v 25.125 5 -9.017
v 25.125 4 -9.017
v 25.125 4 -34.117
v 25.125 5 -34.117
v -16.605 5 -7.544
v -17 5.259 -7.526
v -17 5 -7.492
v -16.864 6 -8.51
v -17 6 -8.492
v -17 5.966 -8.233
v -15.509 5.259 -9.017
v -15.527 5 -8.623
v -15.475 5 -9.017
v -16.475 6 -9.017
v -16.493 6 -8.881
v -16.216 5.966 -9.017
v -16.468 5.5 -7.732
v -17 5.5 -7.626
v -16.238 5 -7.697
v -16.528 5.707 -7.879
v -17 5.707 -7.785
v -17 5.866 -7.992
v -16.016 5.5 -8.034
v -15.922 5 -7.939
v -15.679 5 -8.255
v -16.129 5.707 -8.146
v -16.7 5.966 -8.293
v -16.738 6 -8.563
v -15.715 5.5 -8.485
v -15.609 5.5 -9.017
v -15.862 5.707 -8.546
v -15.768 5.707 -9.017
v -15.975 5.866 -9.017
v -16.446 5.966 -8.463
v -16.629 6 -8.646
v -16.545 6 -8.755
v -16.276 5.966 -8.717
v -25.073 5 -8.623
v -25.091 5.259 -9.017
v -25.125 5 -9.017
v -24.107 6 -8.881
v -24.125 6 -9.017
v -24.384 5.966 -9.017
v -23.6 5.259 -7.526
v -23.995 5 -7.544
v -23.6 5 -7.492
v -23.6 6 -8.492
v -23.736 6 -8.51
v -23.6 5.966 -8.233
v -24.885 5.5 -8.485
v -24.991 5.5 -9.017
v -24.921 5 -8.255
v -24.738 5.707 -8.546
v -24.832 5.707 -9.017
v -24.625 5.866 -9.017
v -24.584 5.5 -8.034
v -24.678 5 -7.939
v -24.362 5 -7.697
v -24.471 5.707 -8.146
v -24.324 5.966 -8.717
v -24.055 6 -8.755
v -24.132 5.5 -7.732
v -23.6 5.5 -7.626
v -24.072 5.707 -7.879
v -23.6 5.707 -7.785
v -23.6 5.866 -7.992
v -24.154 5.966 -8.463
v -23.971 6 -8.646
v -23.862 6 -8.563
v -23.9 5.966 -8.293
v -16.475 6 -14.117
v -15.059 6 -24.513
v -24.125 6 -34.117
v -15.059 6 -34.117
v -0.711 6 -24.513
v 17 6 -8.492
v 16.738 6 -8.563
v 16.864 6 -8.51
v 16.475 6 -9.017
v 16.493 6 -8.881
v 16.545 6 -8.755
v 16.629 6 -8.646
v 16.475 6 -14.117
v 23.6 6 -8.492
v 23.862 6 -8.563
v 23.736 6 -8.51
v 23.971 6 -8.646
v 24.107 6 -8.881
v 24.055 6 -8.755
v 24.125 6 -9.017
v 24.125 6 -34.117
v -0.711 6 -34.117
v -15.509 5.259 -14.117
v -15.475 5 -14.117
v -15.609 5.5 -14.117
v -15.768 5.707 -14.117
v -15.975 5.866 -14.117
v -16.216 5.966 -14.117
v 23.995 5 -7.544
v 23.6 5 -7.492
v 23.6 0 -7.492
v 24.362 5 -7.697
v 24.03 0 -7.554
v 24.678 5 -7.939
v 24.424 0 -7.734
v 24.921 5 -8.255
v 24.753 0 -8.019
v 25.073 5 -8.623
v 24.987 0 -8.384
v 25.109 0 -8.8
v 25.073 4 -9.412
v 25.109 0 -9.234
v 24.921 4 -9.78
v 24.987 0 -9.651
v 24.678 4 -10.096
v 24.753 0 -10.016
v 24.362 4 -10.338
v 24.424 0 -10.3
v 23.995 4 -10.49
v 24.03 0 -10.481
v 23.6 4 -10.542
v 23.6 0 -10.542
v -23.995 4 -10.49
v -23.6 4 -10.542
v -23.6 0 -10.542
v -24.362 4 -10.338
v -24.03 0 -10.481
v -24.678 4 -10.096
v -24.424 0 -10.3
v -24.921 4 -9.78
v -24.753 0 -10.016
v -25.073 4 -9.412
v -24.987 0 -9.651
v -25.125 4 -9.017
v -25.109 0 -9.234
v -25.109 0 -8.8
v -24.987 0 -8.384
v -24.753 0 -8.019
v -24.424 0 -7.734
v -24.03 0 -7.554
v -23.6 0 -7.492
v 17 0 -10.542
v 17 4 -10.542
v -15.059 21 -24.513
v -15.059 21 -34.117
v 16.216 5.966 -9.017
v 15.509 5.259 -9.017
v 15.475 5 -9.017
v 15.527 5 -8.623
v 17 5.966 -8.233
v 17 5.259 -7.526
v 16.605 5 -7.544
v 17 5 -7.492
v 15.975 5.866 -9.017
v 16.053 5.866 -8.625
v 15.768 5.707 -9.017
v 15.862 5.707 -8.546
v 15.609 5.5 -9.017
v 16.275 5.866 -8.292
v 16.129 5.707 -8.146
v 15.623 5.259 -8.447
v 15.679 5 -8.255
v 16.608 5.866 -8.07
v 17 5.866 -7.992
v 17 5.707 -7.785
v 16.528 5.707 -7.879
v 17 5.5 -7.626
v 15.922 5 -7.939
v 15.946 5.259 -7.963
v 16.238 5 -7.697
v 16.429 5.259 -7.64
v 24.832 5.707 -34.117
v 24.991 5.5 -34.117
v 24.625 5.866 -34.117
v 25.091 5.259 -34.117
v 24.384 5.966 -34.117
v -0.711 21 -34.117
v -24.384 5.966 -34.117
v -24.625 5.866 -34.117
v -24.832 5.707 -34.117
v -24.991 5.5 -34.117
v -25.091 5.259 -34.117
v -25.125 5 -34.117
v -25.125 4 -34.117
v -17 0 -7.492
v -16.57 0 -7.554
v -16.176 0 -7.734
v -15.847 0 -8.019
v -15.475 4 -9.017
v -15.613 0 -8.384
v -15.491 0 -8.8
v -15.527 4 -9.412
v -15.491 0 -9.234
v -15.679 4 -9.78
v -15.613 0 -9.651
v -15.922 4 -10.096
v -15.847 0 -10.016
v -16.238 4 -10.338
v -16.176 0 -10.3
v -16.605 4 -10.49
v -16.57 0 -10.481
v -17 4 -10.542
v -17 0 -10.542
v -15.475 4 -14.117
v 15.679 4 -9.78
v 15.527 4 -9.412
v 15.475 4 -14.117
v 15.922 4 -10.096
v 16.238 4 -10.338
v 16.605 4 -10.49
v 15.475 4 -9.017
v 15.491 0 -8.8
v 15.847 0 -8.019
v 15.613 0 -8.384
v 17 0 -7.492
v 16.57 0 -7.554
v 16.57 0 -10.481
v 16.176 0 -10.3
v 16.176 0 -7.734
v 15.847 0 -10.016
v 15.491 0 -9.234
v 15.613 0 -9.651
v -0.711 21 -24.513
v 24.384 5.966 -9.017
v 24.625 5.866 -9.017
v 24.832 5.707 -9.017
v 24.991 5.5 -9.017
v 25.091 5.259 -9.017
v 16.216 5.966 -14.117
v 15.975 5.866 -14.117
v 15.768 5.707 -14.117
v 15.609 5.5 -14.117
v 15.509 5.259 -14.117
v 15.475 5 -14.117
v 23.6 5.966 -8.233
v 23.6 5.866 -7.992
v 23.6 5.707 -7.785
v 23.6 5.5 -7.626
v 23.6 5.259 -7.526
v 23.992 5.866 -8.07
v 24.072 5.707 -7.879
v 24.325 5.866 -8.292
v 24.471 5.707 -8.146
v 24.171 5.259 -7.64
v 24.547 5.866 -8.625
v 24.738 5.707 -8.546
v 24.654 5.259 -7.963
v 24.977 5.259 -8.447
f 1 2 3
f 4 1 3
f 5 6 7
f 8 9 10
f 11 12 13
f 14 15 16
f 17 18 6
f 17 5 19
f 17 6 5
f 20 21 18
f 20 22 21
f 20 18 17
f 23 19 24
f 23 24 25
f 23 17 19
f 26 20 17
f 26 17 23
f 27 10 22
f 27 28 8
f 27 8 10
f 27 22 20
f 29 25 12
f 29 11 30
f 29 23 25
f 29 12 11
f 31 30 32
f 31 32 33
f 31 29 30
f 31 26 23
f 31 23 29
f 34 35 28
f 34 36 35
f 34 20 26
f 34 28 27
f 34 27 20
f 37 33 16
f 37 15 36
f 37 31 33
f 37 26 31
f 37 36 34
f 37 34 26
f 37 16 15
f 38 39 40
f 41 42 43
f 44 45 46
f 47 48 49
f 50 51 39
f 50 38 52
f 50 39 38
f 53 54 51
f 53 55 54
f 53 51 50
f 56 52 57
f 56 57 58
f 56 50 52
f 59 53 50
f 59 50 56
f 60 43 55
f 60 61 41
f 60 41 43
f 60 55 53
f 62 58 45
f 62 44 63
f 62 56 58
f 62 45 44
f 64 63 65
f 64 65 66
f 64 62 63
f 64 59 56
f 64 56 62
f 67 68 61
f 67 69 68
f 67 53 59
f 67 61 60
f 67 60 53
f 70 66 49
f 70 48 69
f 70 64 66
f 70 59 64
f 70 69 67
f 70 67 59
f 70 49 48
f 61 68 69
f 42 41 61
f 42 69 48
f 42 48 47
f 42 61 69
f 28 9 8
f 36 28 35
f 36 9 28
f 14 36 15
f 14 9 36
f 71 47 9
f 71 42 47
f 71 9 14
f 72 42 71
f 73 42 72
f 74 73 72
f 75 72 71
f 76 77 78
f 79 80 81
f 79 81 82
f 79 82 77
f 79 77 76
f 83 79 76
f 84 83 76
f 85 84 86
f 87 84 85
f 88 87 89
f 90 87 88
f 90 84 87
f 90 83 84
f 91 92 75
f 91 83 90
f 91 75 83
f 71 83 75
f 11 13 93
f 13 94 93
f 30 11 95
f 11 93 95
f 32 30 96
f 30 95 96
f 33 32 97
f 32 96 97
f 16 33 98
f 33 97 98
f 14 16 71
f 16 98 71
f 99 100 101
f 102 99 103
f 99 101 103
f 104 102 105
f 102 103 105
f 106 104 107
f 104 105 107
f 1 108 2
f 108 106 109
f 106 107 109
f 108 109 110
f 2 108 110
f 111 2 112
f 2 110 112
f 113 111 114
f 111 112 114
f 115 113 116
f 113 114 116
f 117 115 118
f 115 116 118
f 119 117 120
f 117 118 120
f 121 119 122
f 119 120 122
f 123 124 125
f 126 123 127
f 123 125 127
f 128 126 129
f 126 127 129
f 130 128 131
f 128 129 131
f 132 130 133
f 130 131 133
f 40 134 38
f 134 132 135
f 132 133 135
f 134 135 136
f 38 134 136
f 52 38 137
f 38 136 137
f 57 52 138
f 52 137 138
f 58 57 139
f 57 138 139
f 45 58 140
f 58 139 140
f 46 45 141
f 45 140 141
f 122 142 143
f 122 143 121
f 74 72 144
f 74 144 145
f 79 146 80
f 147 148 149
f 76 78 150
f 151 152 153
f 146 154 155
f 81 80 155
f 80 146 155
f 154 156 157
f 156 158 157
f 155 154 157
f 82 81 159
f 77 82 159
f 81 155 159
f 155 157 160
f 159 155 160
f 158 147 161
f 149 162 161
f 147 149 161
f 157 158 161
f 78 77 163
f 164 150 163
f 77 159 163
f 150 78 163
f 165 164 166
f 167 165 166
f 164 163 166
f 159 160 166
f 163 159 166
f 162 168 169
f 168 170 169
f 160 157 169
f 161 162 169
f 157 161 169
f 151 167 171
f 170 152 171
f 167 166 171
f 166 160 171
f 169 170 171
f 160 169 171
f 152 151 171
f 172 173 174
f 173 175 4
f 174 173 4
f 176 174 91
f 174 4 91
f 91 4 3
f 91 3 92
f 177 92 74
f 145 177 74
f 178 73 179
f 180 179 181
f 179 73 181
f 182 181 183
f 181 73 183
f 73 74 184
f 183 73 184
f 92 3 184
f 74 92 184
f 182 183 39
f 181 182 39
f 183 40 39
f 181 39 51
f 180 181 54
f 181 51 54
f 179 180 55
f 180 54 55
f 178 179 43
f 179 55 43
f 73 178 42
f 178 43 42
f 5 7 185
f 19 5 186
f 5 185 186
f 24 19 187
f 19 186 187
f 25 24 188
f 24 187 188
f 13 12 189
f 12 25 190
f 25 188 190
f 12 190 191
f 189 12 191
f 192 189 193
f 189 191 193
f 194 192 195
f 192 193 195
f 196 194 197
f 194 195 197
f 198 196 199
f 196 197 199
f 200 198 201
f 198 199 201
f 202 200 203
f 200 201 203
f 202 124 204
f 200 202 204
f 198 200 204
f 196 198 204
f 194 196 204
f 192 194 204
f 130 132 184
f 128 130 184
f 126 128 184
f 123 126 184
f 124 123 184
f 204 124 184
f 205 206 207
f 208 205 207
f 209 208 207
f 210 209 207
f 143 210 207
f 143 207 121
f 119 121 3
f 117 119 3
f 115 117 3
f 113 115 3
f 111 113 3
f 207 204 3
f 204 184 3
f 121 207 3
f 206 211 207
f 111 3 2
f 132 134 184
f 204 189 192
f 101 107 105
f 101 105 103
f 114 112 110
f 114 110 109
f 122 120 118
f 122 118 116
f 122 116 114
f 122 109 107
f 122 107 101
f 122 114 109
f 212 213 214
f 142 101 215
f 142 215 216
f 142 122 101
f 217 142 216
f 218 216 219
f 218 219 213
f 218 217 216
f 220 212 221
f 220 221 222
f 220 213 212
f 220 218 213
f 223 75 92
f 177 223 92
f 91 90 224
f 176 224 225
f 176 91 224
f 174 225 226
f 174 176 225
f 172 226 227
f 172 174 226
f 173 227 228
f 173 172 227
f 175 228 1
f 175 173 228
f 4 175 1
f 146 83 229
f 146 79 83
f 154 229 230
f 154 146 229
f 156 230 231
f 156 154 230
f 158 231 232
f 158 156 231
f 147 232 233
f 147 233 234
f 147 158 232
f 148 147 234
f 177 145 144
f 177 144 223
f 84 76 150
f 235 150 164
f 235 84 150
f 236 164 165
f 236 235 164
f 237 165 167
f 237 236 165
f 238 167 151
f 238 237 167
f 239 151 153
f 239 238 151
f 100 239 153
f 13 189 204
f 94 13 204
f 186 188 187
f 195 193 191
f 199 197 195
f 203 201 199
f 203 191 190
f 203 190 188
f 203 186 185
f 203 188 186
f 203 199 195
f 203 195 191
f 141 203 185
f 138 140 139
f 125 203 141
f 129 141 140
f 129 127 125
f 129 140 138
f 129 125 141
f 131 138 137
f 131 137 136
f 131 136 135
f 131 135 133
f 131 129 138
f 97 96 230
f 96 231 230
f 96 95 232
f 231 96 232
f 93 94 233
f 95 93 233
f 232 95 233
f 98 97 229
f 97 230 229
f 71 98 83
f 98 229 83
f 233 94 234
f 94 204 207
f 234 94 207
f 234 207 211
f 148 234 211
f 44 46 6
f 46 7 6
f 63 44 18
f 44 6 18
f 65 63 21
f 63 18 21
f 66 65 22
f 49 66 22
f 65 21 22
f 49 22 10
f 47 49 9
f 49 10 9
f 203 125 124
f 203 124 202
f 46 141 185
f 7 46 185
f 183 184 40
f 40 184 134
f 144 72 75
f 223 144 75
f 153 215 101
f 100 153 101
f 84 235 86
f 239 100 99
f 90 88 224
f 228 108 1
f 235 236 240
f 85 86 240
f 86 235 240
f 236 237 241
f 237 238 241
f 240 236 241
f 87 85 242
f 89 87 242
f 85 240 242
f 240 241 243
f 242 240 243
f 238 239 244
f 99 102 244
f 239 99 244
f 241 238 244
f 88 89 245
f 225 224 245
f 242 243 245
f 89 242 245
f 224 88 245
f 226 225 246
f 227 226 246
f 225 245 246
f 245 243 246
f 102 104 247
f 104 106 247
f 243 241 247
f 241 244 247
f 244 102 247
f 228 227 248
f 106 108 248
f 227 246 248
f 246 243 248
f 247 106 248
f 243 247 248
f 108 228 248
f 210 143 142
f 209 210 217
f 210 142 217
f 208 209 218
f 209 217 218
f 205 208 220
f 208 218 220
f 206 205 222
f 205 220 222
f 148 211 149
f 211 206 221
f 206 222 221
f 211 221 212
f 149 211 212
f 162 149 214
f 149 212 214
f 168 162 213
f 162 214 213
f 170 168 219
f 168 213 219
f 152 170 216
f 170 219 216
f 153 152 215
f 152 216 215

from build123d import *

# Parameters (mm, degrees)
BOSS_EXTRUDE1_DEPTH   = 4
BOSS_EXTRUDE1_2_DEPTH = 4
BOSS_EXTRUDE3_DEPTH   = 2
FILLET2_R             = 1
SKETCH4_W             = 14.347682942
SKETCH4_H             = 9.604544397
BOSS_EXTRUDE4_DEPTH   = 15


with BuildPart() as part:
    # Sketch1 → Boss-Extrude1 (new body)
    with BuildSketch(Plane(origin=(0, 0, 0), x_dir=(1, 0, 0), z_dir=(0, 1, 0))):
        with BuildLine():
            Line((-23.6, 10.542278437), (-17, 10.542278437))
            ThreePointArc((-17, 10.542278437), (-15.475, 9.017278437), (-17, 7.492278437))
            Line((-17, 7.492278437), (-23.6, 7.492278437))
            ThreePointArc((-23.6, 7.492278437), (-25.125, 9.017278437), (-23.6, 10.542278437))
        make_face()
    extrude(amount=BOSS_EXTRUDE1_DEPTH)



with BuildPart() as body_2:
    # Sketch1 → Boss-Extrude1 2 (new body)
    with BuildSketch(Plane(origin=(0, 0, 0), x_dir=(1, 0, 0), z_dir=(0, 1, 0))):
        with BuildLine():
            Line((23.6, 7.492278437), (17, 7.492278437))
            ThreePointArc((17, 7.492278437), (15.475, 9.017278437), (17, 10.542278437))
            Line((17, 10.542278437), (23.6, 10.542278437))
            ThreePointArc((23.6, 10.542278437), (25.125, 9.017278437), (23.6, 7.492278437))
        make_face()
    extrude(amount=BOSS_EXTRUDE1_2_DEPTH)


with BuildPart() as part_1:
    add(part.part)

    add(body_2.part)  # Boss-Extrude3 merges body 2
    # Sketch3 → Boss-Extrude3 (add)
    with BuildSketch(Plane(origin=(0, 4, 0), x_dir=(1, 0, 0), z_dir=(0, 1, 0))):
        with BuildLine():
            ThreePointArc((15.475, 9.017278437), (15.921662159, 7.938940596), (17, 7.492278437))
            Line((17, 7.492278437), (23.6, 7.492278437))
            ThreePointArc((23.6, 7.492278437), (24.678337841, 7.938940596), (25.125, 9.017278437))
            Line((25.125, 9.017278437), (25.125, 17.305889592))
            Line((25.125, 17.305889592), (25.125, 34.117278437))
            Line((25.125, 34.117278437), (-25.125, 34.117278437))
            Line((-25.125, 34.117278437), (-25.125, 17.305889592))
            Line((-25.125, 17.305889592), (-25.125, 9.017278437))
            ThreePointArc((-25.125, 9.017278437), (-24.678337841, 10.095616278), (-23.6, 10.542278437))
            Line((-23.6, 10.542278437), (-17, 10.542278437))
            ThreePointArc((-17, 10.542278437), (-15.921662159, 10.095616278), (-15.475, 9.017278437))
            Line((-15.475, 9.017278437), (-15.475, 14.117278437))
            Line((-15.475, 14.117278437), (15.475, 14.117278437))
            Line((15.475, 14.117278437), (15.475, 9.017278437))
        make_face()
        with BuildLine():
            Line((-17, 10.542278437), (-23.6, 10.542278437))
            ThreePointArc((-23.6, 10.542278437), (-25.125, 9.017278437), (-23.6, 7.492278437))
            Line((-23.6, 7.492278437), (-17, 7.492278437))
            ThreePointArc((-17, 7.492278437), (-15.475, 9.017278437), (-17, 10.542278437))
        make_face()
    extrude(amount=BOSS_EXTRUDE3_DEPTH)

    # Fillet2
    fillet2_edges = [part_1.edges().sort_by_distance(p)[0] for p in [
        (-25.125, 6, -21.567278437),
        (15.475, 6, -11.567278437),
        (-24.678337841, 6, -7.938940596),
        (-20.3, 6, -7.492278437),
        (-15.921662159, 6, -7.938940596),
        (-15.475, 6, -11.567278437),
        (15.921662159, 6, -7.938940596),
        (20.3, 6, -7.492278437),
        (24.678337841, 6, -7.938940596),
        (25.125, 6, -21.567278437),
    ]]
    fillet(fillet2_edges, radius=FILLET2_R)

    # Sketch4 → Boss-Extrude4 (add)
    with BuildSketch(Plane(origin=(0, 6, 0), x_dir=(1, 0, 0), z_dir=(0, 1, 0))):
        with Locations((-7.885296824, 29.315006239)):
            Rectangle(SKETCH4_W, SKETCH4_H)
    extrude(amount=BOSS_EXTRUDE4_DEPTH)


solid = part_1.part
